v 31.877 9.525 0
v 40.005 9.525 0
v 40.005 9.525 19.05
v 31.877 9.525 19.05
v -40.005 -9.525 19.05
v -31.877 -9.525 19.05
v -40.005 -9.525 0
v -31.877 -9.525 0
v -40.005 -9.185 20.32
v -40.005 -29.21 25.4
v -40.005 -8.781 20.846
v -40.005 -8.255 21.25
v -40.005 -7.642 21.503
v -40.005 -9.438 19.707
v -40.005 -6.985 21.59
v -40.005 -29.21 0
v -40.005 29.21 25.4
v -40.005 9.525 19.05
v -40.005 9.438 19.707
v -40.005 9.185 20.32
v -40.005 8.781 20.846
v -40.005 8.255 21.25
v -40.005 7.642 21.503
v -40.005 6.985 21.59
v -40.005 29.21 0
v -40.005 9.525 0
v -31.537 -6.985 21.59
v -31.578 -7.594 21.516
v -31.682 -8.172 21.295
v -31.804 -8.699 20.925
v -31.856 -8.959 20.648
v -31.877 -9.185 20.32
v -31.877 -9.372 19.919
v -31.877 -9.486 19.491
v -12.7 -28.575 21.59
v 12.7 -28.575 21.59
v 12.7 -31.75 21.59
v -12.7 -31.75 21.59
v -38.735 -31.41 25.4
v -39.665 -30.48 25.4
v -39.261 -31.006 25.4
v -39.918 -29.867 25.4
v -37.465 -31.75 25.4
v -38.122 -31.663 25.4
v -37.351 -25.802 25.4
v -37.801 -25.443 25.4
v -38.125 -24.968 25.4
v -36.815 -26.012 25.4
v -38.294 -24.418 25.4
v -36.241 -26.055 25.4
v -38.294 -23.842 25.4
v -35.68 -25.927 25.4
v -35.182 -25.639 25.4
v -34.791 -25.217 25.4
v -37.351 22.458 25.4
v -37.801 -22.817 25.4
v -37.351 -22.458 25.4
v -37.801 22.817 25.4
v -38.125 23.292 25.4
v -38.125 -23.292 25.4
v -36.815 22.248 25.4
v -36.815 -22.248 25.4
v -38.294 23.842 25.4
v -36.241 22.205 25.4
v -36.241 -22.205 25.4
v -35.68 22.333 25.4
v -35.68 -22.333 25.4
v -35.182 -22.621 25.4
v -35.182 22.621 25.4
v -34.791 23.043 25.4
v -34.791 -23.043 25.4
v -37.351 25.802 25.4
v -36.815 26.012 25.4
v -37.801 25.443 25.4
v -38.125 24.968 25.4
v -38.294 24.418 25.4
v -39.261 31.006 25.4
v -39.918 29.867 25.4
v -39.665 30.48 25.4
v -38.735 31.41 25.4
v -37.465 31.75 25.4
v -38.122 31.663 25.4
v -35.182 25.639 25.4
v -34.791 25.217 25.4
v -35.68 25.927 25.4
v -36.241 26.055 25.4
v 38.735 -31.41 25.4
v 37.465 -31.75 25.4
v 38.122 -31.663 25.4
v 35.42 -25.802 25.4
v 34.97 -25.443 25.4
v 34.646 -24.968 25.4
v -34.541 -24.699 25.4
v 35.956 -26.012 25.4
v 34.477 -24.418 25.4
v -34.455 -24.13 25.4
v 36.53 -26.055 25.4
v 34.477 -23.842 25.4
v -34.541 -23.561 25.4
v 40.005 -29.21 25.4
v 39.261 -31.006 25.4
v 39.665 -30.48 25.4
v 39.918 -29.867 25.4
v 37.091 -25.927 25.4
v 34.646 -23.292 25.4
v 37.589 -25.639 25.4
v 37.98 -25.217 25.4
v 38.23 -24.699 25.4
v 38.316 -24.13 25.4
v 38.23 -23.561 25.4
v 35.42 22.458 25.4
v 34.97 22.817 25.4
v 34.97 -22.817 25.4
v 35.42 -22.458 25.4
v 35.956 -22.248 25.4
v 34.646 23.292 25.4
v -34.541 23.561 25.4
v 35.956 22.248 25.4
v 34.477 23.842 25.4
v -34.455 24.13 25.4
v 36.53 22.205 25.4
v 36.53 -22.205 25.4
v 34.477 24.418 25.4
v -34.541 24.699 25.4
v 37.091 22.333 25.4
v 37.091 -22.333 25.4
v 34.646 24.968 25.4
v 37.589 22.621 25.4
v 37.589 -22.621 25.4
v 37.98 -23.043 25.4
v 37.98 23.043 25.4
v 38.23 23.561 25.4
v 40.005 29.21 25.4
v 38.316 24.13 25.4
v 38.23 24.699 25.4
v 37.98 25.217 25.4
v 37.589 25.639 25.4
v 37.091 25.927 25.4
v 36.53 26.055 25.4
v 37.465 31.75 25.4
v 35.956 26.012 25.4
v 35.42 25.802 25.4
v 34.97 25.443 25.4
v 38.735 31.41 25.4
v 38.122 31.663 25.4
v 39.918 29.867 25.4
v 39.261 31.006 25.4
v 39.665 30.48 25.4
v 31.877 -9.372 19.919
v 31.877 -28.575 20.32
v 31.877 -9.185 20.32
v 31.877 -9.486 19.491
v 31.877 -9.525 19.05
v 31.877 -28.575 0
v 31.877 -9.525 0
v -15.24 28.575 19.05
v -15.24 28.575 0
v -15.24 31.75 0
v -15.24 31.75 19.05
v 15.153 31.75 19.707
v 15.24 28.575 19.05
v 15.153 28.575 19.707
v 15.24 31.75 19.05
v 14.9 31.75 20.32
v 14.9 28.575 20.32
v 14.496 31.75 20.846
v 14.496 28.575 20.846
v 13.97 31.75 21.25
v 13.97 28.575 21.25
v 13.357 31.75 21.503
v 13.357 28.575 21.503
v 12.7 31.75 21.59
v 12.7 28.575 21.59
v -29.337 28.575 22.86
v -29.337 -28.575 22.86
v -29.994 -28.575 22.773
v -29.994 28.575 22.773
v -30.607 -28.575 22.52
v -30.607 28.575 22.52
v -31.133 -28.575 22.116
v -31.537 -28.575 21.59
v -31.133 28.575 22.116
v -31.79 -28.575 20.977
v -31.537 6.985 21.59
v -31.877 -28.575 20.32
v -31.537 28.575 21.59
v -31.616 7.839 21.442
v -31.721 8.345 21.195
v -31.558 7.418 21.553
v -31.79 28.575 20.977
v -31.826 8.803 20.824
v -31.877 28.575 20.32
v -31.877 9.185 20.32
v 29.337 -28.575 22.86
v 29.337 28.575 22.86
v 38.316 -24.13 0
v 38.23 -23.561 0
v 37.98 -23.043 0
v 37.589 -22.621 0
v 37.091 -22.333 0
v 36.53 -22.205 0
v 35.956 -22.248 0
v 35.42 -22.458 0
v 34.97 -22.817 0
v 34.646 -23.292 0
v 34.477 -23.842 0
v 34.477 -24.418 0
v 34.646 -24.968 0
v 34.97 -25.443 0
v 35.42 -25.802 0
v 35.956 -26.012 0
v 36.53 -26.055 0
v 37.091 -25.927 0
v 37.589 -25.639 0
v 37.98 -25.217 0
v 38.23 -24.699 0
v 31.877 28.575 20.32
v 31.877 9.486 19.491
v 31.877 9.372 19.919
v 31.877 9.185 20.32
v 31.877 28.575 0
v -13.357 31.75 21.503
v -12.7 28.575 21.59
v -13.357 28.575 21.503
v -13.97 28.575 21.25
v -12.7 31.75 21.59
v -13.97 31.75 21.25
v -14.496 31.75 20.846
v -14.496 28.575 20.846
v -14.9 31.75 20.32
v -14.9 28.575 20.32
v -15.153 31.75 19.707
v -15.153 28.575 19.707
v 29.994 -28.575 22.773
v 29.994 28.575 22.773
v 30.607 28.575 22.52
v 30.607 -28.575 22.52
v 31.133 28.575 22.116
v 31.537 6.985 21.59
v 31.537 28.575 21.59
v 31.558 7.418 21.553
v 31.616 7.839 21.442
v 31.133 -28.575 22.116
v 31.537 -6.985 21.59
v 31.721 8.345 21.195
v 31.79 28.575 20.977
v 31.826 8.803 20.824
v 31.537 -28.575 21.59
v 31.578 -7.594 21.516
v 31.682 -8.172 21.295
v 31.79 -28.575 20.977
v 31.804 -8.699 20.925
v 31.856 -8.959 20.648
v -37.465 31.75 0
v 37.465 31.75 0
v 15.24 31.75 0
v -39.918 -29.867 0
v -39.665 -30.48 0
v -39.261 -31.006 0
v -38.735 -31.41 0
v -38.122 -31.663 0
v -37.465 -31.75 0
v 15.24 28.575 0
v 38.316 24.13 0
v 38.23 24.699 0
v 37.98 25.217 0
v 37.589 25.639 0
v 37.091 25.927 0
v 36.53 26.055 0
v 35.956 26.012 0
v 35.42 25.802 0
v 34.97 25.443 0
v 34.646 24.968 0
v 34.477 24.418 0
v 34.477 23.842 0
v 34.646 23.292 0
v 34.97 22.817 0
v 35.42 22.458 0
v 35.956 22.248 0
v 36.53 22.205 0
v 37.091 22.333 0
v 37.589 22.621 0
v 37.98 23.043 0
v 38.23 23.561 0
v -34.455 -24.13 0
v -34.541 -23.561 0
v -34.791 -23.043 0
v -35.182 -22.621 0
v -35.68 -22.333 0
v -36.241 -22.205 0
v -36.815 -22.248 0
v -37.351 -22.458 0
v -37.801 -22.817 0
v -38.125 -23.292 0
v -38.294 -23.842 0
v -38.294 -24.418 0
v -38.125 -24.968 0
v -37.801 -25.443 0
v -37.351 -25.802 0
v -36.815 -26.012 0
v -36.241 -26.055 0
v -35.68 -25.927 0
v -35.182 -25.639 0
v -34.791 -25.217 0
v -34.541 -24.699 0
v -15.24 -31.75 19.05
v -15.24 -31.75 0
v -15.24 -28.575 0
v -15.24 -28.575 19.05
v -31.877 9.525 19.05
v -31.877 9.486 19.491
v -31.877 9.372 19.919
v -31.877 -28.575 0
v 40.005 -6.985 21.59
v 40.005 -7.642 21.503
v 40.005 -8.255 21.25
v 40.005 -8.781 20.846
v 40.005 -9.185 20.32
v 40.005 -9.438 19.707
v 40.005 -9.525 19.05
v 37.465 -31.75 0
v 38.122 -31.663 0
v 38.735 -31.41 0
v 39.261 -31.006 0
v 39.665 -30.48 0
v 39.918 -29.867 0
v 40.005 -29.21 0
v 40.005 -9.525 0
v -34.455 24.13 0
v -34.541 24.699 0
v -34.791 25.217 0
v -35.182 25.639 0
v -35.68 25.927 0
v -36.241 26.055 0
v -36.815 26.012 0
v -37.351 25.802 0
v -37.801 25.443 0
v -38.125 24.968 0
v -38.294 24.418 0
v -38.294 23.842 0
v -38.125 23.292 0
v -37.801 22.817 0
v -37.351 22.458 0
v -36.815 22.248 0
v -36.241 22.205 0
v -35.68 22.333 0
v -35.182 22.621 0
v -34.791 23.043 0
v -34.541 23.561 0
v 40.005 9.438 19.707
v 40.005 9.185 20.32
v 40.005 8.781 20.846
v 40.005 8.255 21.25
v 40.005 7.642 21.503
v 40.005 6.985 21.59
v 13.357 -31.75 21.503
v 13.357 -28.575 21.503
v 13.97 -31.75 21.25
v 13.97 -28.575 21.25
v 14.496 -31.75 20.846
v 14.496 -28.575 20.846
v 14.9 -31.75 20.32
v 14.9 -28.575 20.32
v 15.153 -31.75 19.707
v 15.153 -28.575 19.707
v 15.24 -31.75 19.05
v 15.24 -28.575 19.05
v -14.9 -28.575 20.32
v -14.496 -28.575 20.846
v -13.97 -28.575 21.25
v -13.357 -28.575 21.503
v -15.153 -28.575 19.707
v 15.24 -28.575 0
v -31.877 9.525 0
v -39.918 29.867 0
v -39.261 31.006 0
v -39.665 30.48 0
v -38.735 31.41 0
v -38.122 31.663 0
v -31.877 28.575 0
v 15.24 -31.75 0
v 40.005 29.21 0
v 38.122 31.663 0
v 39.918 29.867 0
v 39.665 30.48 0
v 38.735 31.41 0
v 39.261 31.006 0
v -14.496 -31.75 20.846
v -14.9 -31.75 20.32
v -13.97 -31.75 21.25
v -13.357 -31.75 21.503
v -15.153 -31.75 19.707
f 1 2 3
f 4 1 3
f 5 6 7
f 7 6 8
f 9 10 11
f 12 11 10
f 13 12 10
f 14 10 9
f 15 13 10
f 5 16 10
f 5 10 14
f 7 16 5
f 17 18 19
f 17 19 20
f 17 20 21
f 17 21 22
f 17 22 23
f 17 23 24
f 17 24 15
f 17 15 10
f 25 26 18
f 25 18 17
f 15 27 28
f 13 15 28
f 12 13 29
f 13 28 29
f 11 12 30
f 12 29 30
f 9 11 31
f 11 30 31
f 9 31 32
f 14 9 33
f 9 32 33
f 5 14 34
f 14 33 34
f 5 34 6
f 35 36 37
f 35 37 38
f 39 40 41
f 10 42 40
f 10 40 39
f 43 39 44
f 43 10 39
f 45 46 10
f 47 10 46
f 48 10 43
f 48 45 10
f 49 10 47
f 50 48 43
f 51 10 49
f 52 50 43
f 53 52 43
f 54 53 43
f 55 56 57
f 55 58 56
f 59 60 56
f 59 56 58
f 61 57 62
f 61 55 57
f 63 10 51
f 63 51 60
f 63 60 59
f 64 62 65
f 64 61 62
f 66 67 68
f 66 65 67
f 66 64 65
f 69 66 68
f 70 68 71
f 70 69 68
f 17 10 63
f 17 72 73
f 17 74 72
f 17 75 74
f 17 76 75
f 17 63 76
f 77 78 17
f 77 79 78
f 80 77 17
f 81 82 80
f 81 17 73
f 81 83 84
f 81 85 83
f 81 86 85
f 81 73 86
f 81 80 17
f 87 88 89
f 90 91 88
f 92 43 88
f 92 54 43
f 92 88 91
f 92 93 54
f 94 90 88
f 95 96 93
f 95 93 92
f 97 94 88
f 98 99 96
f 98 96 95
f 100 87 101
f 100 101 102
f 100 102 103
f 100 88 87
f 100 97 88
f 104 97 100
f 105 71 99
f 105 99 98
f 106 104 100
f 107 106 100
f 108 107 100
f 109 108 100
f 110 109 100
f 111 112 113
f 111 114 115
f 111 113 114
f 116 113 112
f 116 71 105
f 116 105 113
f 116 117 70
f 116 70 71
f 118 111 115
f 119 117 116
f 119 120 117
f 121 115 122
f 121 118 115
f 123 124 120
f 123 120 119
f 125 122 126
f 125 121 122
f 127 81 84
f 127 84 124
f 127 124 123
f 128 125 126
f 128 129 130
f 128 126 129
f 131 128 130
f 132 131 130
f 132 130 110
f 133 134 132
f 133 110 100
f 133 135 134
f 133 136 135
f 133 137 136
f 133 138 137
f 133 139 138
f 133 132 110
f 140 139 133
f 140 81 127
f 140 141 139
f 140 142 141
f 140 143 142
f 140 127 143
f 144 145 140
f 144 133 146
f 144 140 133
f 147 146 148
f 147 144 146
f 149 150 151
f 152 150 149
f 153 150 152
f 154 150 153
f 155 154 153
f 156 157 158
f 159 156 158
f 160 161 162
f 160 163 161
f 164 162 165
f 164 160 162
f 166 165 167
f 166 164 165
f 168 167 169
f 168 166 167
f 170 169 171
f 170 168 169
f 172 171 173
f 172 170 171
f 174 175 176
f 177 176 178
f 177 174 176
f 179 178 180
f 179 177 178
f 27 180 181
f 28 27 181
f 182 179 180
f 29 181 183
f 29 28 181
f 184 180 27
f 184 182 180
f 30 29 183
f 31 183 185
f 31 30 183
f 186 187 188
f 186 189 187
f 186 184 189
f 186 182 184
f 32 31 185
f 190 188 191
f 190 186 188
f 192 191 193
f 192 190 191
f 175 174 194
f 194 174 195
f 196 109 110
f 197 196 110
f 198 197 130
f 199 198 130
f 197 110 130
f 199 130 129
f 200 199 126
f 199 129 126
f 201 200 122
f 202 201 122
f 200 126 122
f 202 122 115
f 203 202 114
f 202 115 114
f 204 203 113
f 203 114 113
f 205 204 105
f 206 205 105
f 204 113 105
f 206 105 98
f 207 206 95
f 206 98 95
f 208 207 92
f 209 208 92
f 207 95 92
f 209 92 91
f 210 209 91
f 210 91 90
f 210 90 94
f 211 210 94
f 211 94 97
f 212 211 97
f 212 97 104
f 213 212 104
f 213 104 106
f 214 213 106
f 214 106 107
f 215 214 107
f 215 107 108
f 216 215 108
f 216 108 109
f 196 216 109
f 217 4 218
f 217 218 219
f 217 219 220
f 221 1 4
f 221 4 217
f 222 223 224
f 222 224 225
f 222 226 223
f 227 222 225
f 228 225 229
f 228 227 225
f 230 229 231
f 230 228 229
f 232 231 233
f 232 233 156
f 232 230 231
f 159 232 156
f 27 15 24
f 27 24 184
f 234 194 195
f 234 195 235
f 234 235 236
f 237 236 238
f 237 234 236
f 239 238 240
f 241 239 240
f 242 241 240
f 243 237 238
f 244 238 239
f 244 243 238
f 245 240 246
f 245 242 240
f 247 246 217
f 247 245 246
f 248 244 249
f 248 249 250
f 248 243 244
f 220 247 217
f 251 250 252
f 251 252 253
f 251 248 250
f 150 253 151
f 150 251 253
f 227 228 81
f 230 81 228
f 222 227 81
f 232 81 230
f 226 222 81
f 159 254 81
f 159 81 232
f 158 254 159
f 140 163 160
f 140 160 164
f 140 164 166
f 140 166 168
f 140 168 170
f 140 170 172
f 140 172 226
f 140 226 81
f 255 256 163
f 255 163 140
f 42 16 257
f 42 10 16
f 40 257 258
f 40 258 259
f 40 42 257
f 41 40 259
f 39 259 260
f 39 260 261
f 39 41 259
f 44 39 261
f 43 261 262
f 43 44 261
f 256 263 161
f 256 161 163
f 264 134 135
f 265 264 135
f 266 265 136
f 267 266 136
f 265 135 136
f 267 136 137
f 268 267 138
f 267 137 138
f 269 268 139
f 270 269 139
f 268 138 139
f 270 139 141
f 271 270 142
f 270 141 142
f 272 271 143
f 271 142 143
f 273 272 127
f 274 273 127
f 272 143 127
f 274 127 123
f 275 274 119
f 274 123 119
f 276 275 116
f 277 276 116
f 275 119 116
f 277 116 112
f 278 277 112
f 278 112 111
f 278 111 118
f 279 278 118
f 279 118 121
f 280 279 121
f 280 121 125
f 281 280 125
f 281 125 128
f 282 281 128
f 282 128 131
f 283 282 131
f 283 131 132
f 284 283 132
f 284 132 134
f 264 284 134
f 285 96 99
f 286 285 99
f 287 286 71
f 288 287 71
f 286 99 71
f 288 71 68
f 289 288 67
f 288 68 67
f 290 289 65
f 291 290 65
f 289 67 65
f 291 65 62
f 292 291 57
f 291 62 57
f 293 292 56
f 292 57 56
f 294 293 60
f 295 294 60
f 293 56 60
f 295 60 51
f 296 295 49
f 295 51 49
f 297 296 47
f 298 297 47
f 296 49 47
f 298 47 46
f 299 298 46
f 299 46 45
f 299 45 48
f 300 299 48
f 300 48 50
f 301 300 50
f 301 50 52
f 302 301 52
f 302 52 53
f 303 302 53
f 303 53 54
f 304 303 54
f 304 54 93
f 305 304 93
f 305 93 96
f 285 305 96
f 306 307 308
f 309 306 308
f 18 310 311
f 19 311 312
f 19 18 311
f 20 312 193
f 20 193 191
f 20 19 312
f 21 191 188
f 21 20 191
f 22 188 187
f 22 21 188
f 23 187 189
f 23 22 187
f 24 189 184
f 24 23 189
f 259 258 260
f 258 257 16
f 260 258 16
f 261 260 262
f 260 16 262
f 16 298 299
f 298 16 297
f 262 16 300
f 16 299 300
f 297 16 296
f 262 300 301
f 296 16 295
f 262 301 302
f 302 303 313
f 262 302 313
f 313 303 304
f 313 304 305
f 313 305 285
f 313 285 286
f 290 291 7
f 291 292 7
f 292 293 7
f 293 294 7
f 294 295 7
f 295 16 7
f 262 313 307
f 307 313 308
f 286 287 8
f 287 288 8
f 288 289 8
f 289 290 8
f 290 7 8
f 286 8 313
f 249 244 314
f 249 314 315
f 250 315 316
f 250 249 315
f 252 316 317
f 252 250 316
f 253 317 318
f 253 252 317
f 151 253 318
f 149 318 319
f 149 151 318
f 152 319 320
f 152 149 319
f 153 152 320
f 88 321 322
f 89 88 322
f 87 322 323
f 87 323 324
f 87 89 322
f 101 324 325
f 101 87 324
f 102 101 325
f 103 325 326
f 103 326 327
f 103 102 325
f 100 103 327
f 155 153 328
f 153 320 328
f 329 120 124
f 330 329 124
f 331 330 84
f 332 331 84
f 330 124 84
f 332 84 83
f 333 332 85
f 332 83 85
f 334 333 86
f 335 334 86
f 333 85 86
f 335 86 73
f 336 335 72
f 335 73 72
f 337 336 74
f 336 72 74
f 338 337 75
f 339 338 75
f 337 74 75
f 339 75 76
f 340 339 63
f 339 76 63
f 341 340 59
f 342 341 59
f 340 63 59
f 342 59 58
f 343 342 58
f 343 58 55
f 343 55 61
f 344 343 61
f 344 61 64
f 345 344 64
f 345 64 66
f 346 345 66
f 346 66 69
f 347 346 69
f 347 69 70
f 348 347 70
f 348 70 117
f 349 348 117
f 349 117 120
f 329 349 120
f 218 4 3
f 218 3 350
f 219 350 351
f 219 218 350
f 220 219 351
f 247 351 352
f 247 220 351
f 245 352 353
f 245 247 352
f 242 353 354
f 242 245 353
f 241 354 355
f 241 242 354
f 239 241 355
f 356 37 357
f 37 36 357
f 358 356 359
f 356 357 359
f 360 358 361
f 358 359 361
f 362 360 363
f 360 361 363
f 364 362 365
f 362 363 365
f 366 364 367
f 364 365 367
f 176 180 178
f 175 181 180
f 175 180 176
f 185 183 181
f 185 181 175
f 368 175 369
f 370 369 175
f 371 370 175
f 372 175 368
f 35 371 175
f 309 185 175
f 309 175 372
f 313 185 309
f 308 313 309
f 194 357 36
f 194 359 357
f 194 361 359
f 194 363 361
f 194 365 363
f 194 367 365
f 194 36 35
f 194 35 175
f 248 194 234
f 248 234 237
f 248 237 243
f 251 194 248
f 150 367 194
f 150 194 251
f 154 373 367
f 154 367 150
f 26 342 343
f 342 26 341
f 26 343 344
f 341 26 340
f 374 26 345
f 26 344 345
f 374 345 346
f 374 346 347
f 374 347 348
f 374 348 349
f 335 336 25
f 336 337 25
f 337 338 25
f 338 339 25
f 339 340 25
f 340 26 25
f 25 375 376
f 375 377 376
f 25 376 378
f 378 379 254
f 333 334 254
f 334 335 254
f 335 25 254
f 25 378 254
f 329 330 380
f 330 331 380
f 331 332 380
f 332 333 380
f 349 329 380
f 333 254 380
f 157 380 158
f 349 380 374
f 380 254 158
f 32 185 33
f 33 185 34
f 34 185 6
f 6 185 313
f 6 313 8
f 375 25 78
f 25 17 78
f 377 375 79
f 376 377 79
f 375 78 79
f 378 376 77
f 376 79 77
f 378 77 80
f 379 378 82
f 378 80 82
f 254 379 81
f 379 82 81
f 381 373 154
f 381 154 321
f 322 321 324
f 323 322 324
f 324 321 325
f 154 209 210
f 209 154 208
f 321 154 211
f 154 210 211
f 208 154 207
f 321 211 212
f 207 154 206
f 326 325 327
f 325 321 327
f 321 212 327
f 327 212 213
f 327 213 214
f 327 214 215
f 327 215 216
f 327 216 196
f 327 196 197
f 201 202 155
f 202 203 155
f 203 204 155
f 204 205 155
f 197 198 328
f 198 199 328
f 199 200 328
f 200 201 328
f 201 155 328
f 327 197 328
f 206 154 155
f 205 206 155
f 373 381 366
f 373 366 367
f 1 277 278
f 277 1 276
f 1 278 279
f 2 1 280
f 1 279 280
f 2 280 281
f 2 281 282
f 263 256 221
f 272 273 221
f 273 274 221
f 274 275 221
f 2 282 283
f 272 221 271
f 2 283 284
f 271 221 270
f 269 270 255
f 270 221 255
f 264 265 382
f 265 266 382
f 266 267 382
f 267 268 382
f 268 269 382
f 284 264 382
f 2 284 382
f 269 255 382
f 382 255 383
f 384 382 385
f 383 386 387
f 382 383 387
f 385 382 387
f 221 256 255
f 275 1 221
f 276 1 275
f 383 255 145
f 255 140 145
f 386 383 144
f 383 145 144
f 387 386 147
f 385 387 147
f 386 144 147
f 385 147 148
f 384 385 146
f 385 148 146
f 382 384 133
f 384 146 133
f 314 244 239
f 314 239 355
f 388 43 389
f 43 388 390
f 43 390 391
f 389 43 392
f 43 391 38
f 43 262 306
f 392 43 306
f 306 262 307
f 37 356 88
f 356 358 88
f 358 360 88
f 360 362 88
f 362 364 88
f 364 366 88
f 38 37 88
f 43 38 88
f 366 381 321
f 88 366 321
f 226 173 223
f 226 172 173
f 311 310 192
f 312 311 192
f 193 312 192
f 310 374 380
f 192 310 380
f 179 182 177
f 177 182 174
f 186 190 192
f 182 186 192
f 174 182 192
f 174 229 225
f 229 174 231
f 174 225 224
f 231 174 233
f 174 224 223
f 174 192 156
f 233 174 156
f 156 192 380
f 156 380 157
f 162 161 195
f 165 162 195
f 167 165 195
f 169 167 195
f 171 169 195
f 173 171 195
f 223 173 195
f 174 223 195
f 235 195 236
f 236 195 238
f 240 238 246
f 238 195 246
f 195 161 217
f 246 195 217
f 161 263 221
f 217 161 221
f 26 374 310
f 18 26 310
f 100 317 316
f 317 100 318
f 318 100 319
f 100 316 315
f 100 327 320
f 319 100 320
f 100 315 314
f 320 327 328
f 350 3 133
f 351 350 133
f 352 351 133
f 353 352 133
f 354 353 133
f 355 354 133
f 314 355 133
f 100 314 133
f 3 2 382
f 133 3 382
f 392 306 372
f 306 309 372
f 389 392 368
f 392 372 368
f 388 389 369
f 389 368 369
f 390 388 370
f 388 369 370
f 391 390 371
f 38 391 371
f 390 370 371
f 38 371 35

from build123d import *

# Parameters (mm, degrees)
SKETCH1_W             = 80.01
SKETCH1_H             = 63.5
BOSS_EXTRUDE1_DEPTH   = 25.4
SKETCH2_W             = 63.754
SKETCH2_H             = 57.15
CUT_EXTRUDE1_DEPTH    = 22.86
F_8_CLEARANCE_HOLE1_D = 3.8608
SKETCH13_W            = 20.32
SKETCH13_H            = 21.59
CUT_EXTRUDE3_DEPTH    = 50.8
SKETCH14_W            = 8.128
SKETCH14_H            = 19.05
CUT_EXTRUDE4_DEPTH    = 21.59
SKETCH15_W            = 30.48
SKETCH15_H            = 3.175
CUT_EXTRUDE5_DEPTH    = 21.59
FILLET1_R             = 2.54
FILLET2_R             = 2.54
FILLET3_R             = 2.54


with BuildPart() as part:
    # Sketch1 → Boss-Extrude1 (new body)
    with BuildSketch(Plane.XY):
        Rectangle(SKETCH1_W, SKETCH1_H)
    extrude(amount=BOSS_EXTRUDE1_DEPTH)

    # Sketch2 → Cut-Extrude1 (cut)
    with BuildSketch(Plane.XY):
        Rectangle(SKETCH2_W, SKETCH2_H)
    extrude(amount=CUT_EXTRUDE1_DEPTH, mode=Mode.SUBTRACT)

    # #8 Clearance Hole1 (through all)
    with Locations(Plane(origin=(0, 0, 0), x_dir=(-1, 0, 0), z_dir=(0, 0, -1))):
        with Locations((-36.3855, -24.13), (-36.3855, 24.13), (36.3855, 24.13), (36.3855, -24.13)):
            Hole(F_8_CLEARANCE_HOLE1_D / 2)

    # Sketch13 → Cut-Extrude3 (cut)
    with BuildSketch(Plane(origin=(0, 0, 0), x_dir=(1, 0, 0), z_dir=(0, 1, 0))):
        with Locations((0, -10.795)):
            Rectangle(SKETCH13_W, SKETCH13_H)
    extrude(amount=-CUT_EXTRUDE3_DEPTH, mode=Mode.SUBTRACT)

    # Sketch14 → Cut-Extrude4 (cut)
    with BuildSketch(Plane(origin=(0, 0, 0), x_dir=(-1, 0, 0), z_dir=(0, 0, -1))):
        with Locations((-35.941, 0)):
            Rectangle(SKETCH14_W, SKETCH14_H)
        with Locations((35.941, 0)):
            Rectangle(SKETCH14_W, SKETCH14_H)
    extrude(amount=-CUT_EXTRUDE4_DEPTH, mode=Mode.SUBTRACT)

    # Sketch15 → Cut-Extrude5 (cut)
    with BuildSketch(Plane(origin=(0, 0, 0), x_dir=(-1, 0, 0), z_dir=(0, 0, -1))):
        with Locations((0, 30.1625)):
            Rectangle(SKETCH15_W, SKETCH15_H)
        with Locations((0, -30.1625)):
            Rectangle(SKETCH15_W, SKETCH15_H)
    extrude(amount=-CUT_EXTRUDE5_DEPTH, mode=Mode.SUBTRACT)

    # Fillet1
    # the kernel refuses this fillet: 2.54 mm, written as the material it adds along each edge
    with BuildSketch(Plane(origin=(31.877, -28.575, 22.86), x_dir=(0, 0, -1), z_dir=(0, 1, 0))) as fillet1_piece_1_section:
        with BuildLine():
            CenterArc((FILLET1_R, FILLET1_R), FILLET1_R, 180, 90)
            Line((0, FILLET1_R), (0, 0))
            Line((0, 0), (FILLET1_R, 0))
        make_face()
    fillet1_piece_1 = extrude(amount=63.5, mode=Mode.PRIVATE)
    fillet1_piece_1 = split(fillet1_piece_1, bisect_by=Plane(origin=(31.776201135, -9.525, 21.276910424), z_dir=(0, -1, 0)), keep=Keep.TOP, mode=Mode.PRIVATE)
    add(fillet1_piece_1)
    with BuildSketch(Plane(origin=(31.877, -34.925, 22.86), x_dir=(0, 0, -1), z_dir=(0, 1, 0))) as fillet1_piece_2_section:
        with BuildLine():
            CenterArc((FILLET1_R, FILLET1_R), FILLET1_R, 180, 90)
            Line((0, FILLET1_R), (0, 0))
            Line((0, 0), (FILLET1_R, 0))
        make_face()
    fillet1_piece_2 = extrude(amount=63.5, mode=Mode.PRIVATE)
    fillet1_piece_2 = split(fillet1_piece_2, bisect_by=Plane(origin=(31.257176883, 0, 21.59), z_dir=(0, 0, 1)), keep=Keep.TOP, mode=Mode.PRIVATE)
    fillet1_piece_2 = split(fillet1_piece_2, bisect_by=Plane(origin=(31.257176883, -9.525, 22.406874338), z_dir=(0, 1, 0)), keep=Keep.TOP, mode=Mode.PRIVATE)
    add(fillet1_piece_2)
    with BuildSketch(Plane(origin=(31.877, -34.925, 22.86), x_dir=(0, 0, -1), z_dir=(0, 1, 0))) as fillet1_piece_3_section:
        with BuildLine():
            CenterArc((FILLET1_R, FILLET1_R), FILLET1_R, 180, 90)
            Line((0, FILLET1_R), (0, 0))
            Line((0, 0), (FILLET1_R, 0))
        make_face()
    fillet1_piece_3 = extrude(amount=63.5, mode=Mode.PRIVATE)
    fillet1_piece_3 = split(fillet1_piece_3, bisect_by=Plane(origin=(31.776201135, 9.525, 21.276910424), z_dir=(0, 1, 0)), keep=Keep.TOP, mode=Mode.PRIVATE)
    add(fillet1_piece_3)
    with BuildSketch(Plane(origin=(-31.877, 28.575, 22.86), x_dir=(1, 0, 0), z_dir=(0, -1, 0))) as fillet1_piece_4_section:
        with BuildLine():
            CenterArc((FILLET1_R, -FILLET1_R), FILLET1_R, 90, 90)
            Line((0, -FILLET1_R), (0, 0))
            Line((0, 0), (FILLET1_R, 0))
        make_face()
    fillet1_piece_4 = extrude(amount=57.15, mode=Mode.PRIVATE)
    fillet1_piece_4 = split(fillet1_piece_4, bisect_by=Plane(origin=(-31.257176883, 19.05, 21.59), z_dir=(0, 0, 1)), keep=Keep.TOP, mode=Mode.PRIVATE)
    add(fillet1_piece_4)
    with BuildSketch(Plane(origin=(-31.877, 28.575, 22.86), x_dir=(1, 0, 0), z_dir=(0, -1, 0))) as fillet1_piece_5_section:
        with BuildLine():
            CenterArc((FILLET1_R, -FILLET1_R), FILLET1_R, 90, 90)
            Line((0, -FILLET1_R), (0, 0))
            Line((0, 0), (FILLET1_R, 0))
        make_face()
    fillet1_piece_5 = extrude(amount=63.5, mode=Mode.PRIVATE)
    fillet1_piece_5 = split(fillet1_piece_5, bisect_by=Plane(origin=(-31.776201135, 9.525, 21.276910424), z_dir=(0, 1, 0)), keep=Keep.TOP, mode=Mode.PRIVATE)
    add(fillet1_piece_5)
    with BuildSketch(Plane(origin=(-31.877, 34.925, 22.86), x_dir=(1, 0, 0), z_dir=(0, -1, 0))) as fillet1_piece_6_section:
        with BuildLine():
            CenterArc((FILLET1_R, -FILLET1_R), FILLET1_R, 90, 90)
            Line((0, -FILLET1_R), (0, 0))
            Line((0, 0), (FILLET1_R, 0))
        make_face()
    fillet1_piece_6 = extrude(amount=63.5, mode=Mode.PRIVATE)
    fillet1_piece_6 = split(fillet1_piece_6, bisect_by=Plane(origin=(-31.776201135, -9.525, 21.276910424), z_dir=(0, -1, 0)), keep=Keep.TOP, mode=Mode.PRIVATE)
    add(fillet1_piece_6)

    # Fillet2
    fillet2_edges = [part.edges().sort_by_distance(p)[0] for p in [
        (-15.24, 30.1625, 21.59),
        (15.24, 30.1625, 21.59),
        (15.24, -30.1625, 21.59),
        (-15.24, -30.1625, 21.59),
        (-35.770852263, 9.525, 21.59),
        (-35.770852263, -9.525, 21.59),
        (35.770852263, -9.525, 21.59),
        (35.770852263, 9.525, 21.59),
    ]]
    fillet(fillet2_edges, radius=FILLET2_R)

    # Fillet3
    fillet3_edges = [part.edges().sort_by_distance(p)[0] for p in [
        (-40.005, 31.75, 12.7),
        (40.005, 31.75, 12.7),
        (40.005, -31.75, 12.7),
        (-40.005, -31.75, 12.7),
    ]]
    fillet(fillet3_edges, radius=FILLET3_R)


solid = part.part
